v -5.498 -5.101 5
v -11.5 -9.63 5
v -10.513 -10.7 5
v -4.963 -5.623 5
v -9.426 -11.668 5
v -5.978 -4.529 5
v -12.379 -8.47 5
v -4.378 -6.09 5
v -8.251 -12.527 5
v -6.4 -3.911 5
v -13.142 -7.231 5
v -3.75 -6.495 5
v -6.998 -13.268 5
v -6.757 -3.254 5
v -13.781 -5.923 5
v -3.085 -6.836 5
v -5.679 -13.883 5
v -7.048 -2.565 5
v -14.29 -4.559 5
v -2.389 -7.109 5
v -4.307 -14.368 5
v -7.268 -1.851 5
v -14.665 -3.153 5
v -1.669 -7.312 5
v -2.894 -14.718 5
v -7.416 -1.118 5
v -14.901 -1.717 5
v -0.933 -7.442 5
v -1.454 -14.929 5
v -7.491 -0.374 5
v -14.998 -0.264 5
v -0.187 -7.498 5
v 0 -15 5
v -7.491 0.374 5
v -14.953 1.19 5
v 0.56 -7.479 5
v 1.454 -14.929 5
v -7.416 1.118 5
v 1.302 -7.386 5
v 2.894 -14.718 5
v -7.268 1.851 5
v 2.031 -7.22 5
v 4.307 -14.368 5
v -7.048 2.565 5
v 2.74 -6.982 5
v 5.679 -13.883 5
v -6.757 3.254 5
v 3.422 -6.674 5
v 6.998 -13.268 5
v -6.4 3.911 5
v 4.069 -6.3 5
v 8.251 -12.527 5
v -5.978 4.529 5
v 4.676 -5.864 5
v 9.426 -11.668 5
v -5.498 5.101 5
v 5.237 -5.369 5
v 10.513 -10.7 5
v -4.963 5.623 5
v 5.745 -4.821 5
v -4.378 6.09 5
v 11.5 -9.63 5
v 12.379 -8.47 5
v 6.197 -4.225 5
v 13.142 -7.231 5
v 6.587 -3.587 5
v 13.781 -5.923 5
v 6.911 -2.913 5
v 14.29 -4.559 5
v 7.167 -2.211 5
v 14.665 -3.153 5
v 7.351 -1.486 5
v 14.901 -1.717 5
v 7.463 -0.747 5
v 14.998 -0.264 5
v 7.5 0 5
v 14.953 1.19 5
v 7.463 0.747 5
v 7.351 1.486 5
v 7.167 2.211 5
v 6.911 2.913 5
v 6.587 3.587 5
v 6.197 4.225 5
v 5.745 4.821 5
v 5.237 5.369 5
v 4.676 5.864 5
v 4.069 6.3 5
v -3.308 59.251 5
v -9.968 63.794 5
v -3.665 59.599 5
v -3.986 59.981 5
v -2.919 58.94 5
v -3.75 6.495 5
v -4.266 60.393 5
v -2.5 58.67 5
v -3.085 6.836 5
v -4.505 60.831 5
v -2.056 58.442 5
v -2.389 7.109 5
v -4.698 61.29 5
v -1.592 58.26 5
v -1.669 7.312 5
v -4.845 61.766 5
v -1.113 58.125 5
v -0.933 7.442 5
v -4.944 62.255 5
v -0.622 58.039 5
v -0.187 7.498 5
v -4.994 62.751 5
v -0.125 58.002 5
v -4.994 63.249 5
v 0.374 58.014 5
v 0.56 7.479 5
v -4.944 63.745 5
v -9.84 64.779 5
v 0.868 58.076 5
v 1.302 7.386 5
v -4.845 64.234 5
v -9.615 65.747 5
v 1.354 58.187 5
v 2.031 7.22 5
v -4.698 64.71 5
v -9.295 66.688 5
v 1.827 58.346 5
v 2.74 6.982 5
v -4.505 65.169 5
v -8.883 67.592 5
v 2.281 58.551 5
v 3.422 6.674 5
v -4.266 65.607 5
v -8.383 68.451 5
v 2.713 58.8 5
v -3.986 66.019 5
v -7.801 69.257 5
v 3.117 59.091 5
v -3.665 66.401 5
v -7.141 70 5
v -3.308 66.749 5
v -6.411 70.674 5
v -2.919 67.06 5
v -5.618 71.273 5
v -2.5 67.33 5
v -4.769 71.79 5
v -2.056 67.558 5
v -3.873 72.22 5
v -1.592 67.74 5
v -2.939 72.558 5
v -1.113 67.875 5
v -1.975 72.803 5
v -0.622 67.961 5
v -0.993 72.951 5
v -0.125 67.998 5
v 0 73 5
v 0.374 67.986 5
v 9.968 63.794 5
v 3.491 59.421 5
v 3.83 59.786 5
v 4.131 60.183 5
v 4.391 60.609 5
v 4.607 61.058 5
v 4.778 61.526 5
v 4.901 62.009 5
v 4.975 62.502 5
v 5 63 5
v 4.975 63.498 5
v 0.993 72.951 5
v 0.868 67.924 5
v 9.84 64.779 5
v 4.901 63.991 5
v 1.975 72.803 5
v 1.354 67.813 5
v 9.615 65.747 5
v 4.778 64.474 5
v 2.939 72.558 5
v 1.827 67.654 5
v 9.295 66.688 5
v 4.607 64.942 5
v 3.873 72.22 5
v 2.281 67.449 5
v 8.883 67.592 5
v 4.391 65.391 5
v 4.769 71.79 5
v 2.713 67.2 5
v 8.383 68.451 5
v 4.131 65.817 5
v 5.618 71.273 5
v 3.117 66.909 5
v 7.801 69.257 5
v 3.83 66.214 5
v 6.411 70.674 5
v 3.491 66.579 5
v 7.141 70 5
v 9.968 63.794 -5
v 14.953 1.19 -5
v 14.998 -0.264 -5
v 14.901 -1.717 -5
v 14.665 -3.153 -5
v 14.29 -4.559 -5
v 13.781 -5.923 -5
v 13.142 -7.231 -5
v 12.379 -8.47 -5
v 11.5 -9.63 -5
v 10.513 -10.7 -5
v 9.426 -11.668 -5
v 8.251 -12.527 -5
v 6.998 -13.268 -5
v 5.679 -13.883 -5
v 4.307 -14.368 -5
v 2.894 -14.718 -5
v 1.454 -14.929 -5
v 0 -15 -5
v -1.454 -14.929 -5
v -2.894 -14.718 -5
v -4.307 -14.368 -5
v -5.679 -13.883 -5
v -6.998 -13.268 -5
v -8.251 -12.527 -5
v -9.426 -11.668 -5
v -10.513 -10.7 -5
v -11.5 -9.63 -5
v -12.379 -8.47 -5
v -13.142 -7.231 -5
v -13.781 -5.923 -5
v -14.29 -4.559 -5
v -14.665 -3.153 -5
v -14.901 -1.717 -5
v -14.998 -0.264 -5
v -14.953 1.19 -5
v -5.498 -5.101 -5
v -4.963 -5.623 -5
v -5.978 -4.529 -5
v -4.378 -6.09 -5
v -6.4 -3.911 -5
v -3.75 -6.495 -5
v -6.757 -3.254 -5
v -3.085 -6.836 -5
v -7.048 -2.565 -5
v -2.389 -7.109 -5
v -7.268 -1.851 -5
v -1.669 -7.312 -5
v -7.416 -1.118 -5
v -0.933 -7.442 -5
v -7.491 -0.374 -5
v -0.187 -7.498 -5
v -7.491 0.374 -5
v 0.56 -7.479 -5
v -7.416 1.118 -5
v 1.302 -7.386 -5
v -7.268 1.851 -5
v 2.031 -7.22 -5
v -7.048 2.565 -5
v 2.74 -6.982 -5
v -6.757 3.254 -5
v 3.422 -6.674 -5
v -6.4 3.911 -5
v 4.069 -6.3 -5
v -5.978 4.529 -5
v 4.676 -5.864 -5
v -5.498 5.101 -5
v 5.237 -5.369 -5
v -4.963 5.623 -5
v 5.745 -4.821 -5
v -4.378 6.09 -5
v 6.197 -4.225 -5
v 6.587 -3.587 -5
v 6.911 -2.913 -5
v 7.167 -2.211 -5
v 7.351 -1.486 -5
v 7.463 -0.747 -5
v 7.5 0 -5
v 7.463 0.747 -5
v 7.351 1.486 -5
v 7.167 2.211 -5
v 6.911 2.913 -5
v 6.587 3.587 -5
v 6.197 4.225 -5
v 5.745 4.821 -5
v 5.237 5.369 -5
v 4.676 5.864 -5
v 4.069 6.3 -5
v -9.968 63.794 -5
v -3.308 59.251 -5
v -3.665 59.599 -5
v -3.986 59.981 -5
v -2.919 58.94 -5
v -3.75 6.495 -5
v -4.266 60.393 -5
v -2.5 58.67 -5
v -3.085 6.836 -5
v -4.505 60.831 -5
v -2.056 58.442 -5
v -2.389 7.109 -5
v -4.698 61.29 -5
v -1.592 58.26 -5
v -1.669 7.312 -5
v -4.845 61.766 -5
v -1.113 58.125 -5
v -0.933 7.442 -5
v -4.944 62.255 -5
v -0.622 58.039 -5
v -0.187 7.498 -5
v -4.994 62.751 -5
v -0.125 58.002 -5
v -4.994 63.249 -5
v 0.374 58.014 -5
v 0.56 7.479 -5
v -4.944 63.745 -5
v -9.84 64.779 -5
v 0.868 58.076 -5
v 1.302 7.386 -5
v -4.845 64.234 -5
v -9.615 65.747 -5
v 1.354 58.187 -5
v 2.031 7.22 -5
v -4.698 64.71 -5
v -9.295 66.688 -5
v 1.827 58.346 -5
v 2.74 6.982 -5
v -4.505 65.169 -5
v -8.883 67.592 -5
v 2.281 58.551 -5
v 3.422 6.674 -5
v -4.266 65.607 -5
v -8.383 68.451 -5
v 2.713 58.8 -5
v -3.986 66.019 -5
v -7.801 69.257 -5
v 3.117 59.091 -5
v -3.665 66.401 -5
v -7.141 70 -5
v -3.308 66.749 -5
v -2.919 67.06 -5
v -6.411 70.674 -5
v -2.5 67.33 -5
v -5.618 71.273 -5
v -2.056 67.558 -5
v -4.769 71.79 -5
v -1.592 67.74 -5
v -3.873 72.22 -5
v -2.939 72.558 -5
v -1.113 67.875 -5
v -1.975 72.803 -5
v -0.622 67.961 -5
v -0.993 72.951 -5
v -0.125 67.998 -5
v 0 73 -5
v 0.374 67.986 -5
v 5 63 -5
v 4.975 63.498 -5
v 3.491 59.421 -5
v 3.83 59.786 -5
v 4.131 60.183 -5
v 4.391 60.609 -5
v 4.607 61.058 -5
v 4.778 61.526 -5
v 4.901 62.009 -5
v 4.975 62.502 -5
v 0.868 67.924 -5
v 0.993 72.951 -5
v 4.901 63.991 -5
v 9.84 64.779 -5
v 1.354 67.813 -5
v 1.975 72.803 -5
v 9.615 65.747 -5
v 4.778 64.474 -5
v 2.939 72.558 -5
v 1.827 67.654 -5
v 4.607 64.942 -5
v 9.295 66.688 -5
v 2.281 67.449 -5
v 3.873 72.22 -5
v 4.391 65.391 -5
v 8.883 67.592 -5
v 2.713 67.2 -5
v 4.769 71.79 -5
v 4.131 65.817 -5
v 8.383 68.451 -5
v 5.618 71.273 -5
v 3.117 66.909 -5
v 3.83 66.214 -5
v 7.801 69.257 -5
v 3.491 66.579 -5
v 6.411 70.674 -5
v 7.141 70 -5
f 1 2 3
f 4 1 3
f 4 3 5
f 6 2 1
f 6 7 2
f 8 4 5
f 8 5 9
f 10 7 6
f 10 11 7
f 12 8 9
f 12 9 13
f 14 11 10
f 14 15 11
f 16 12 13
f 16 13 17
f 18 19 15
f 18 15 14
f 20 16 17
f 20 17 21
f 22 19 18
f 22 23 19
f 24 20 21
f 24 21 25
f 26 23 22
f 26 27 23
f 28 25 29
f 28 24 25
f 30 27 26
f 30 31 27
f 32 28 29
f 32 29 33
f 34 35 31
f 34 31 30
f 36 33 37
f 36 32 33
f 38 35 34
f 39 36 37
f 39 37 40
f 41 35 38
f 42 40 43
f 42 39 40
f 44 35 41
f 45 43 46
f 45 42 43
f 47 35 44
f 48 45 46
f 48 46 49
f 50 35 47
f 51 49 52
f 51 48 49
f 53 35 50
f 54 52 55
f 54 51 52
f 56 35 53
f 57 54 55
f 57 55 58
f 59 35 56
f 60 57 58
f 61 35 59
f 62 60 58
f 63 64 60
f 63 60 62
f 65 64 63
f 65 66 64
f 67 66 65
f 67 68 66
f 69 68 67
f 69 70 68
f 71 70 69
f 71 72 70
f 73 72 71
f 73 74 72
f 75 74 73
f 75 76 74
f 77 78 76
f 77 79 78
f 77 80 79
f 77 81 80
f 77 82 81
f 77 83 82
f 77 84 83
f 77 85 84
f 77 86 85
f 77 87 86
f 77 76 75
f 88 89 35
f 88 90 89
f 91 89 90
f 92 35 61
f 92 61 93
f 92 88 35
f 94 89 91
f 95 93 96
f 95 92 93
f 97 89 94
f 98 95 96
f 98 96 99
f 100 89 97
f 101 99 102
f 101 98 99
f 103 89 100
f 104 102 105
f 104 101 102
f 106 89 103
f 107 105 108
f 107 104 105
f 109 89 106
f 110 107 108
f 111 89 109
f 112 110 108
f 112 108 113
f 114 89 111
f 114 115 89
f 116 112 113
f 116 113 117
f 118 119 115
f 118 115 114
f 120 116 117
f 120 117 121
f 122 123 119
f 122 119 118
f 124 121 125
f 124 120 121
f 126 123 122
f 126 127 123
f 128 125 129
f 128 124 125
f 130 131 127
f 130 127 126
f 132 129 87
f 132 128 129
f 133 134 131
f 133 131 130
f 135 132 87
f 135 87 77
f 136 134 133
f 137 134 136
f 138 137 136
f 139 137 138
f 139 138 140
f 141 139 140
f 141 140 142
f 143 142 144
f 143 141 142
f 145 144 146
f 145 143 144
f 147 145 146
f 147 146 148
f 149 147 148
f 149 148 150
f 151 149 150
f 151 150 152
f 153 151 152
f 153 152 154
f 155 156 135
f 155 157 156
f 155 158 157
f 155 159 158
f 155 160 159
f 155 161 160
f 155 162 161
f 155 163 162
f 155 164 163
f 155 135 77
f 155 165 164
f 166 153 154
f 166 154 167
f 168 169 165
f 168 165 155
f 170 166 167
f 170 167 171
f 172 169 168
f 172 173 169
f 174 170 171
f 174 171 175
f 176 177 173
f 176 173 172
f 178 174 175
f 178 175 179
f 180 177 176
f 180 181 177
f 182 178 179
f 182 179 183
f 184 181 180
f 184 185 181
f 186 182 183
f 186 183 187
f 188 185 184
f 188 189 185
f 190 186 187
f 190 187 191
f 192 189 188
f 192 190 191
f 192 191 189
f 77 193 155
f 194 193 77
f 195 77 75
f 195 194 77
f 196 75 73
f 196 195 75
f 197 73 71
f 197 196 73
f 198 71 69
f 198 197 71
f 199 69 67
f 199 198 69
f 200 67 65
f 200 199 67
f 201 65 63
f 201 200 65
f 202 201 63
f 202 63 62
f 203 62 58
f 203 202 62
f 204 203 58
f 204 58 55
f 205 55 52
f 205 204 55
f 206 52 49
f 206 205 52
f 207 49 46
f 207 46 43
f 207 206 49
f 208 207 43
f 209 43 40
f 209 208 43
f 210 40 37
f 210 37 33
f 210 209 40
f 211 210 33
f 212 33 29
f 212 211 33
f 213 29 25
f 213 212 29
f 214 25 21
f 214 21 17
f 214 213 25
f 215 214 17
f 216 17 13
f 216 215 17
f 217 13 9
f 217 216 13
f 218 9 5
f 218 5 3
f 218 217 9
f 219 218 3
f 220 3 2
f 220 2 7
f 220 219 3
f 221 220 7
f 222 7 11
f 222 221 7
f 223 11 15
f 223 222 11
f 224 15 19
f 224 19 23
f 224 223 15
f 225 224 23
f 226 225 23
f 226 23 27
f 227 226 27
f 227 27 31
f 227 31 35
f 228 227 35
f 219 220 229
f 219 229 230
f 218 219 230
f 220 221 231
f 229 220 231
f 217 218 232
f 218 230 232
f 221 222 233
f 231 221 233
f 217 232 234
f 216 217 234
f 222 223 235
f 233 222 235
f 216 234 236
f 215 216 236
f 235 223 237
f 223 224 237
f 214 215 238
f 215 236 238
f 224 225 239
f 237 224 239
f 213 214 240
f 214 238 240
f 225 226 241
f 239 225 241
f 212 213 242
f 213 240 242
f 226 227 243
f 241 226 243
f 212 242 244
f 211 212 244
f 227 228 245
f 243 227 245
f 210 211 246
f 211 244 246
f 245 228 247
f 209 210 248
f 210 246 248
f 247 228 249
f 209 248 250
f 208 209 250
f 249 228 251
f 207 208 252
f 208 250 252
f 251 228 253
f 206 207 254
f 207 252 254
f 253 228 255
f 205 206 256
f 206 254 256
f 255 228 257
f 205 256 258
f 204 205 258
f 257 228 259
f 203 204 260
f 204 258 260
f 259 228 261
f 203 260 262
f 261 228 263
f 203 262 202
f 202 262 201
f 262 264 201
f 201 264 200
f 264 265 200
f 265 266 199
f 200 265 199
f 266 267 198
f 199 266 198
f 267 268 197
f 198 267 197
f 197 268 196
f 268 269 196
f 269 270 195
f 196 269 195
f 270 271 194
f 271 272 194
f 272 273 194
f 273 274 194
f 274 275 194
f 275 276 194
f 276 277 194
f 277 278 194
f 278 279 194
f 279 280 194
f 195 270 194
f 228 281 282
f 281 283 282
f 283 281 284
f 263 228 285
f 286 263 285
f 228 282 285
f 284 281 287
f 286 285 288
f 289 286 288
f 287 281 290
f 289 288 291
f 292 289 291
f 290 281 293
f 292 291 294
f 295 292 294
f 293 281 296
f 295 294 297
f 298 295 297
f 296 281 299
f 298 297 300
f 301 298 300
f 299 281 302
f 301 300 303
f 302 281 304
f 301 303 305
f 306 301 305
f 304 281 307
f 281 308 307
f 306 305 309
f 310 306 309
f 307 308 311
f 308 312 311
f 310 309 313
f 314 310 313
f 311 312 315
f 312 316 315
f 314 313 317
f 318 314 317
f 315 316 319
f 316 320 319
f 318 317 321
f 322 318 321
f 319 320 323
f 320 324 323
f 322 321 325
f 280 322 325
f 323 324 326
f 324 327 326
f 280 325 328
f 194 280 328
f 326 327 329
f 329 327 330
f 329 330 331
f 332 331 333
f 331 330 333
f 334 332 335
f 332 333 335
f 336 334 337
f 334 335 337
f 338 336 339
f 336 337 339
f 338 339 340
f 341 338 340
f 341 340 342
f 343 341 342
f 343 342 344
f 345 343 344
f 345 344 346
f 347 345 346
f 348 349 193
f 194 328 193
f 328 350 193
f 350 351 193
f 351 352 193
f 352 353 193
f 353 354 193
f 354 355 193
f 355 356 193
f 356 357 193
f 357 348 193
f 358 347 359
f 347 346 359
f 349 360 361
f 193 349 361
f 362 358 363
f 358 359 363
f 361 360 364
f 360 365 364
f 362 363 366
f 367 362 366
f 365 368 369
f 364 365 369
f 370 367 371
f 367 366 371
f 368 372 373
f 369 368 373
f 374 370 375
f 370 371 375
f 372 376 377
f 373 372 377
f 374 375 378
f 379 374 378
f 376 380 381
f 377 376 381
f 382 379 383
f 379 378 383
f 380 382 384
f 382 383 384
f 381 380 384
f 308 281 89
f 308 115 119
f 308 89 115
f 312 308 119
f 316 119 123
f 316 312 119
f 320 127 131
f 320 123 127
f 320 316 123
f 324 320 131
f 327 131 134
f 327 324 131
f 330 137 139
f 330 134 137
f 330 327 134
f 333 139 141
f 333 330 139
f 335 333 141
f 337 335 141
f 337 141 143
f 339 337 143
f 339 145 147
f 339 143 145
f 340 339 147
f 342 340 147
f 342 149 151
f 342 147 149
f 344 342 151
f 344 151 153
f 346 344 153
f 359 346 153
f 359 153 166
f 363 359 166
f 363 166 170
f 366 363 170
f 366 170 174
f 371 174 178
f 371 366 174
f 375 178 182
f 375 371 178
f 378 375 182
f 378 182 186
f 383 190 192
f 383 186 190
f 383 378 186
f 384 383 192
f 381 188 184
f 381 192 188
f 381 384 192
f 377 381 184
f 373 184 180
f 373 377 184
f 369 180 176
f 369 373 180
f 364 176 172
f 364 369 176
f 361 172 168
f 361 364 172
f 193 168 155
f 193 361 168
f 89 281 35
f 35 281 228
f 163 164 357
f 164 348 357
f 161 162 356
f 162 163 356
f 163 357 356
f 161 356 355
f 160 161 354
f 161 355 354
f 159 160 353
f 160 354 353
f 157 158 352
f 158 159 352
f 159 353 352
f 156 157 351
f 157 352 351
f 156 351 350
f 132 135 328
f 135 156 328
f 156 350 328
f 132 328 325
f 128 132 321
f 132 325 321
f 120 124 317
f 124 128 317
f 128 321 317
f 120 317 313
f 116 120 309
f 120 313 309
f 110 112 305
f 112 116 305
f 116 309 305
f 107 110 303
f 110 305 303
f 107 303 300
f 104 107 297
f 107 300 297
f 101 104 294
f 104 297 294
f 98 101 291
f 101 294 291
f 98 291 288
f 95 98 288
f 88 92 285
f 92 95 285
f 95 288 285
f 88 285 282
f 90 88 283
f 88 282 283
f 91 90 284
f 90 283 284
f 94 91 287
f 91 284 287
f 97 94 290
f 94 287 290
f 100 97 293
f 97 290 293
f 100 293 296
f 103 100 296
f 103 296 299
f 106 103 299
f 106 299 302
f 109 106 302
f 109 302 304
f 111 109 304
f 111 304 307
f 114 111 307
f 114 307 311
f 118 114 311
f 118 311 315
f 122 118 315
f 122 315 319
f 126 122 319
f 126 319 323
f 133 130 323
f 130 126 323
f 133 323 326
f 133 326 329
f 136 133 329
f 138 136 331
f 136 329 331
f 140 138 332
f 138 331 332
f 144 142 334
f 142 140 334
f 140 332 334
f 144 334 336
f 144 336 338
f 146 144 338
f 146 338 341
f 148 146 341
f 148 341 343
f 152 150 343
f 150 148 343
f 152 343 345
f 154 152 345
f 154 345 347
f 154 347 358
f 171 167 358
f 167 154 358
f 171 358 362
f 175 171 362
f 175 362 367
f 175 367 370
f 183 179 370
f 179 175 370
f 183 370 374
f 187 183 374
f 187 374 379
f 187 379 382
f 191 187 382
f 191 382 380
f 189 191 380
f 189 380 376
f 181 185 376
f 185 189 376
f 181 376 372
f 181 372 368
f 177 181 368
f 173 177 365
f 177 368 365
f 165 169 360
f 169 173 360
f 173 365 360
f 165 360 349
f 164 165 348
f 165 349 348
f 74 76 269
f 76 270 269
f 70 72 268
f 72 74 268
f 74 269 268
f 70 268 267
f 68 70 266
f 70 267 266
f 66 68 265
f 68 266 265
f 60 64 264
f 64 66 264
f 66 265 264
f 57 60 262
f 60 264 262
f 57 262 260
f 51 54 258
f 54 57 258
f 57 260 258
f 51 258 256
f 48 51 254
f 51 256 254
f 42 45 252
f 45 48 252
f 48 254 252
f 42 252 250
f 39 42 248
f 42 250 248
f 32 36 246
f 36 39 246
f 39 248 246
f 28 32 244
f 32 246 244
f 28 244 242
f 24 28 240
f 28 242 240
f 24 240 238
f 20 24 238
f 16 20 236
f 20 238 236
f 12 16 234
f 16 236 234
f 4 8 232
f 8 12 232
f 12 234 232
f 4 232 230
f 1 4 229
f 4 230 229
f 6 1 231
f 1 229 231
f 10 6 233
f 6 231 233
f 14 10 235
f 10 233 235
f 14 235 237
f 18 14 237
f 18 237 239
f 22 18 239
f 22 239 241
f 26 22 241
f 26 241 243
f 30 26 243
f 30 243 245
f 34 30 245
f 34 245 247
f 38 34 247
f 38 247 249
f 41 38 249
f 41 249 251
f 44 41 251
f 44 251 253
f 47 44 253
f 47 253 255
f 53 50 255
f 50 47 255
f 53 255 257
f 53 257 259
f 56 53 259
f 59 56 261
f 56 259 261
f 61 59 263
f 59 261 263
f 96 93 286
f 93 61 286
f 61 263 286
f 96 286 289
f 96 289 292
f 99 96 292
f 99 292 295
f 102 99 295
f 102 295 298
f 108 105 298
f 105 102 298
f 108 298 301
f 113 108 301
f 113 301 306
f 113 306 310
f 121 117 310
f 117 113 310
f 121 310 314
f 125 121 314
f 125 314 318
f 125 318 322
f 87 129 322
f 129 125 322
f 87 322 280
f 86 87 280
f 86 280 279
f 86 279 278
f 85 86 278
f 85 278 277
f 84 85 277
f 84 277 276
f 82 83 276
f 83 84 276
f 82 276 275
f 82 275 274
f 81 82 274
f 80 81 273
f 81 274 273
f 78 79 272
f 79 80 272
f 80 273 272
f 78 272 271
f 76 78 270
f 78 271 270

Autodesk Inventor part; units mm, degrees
ref_plane "YZ Plane" through (0, 0, 0) normal (1, 0, 0) x (0, 1, 0)
ref_plane "XZ Plane" through (0, 0, 0) normal (0, 1, 0) x (-1, 0, 0)
ref_plane "XY Plane" through (0, 0, 0) normal (0, 0, 1) x (1, 0, 0)
sketch "Sketch1" plane through (0, 0, 0) normal (0, 0, 1) x (1, 0, 0)
  circle A0 centre (0, 0) radius 7.5
  circle A1 centre (0, 63) radius 5
  circle A2 centre (0, 0) radius 15
  circle A3 centre (0, 63) radius 10
  line L0 (-9.9685, 63.7937) -> (-14.9527, 1.1905)
  line L1 (9.9685, 63.7937) -> (14.9527, 1.1905)
  dimension "d0" = 63
  dimension "d1" = 30
  dimension "d2" = 20
  dimension "d3" = 10
  dimension "d4" = 15
extrude "Extrusion1" add sketch "Sketch1" along normal mid plane 10
properties part number "Eslabón 2" material "Stainless Steel"
